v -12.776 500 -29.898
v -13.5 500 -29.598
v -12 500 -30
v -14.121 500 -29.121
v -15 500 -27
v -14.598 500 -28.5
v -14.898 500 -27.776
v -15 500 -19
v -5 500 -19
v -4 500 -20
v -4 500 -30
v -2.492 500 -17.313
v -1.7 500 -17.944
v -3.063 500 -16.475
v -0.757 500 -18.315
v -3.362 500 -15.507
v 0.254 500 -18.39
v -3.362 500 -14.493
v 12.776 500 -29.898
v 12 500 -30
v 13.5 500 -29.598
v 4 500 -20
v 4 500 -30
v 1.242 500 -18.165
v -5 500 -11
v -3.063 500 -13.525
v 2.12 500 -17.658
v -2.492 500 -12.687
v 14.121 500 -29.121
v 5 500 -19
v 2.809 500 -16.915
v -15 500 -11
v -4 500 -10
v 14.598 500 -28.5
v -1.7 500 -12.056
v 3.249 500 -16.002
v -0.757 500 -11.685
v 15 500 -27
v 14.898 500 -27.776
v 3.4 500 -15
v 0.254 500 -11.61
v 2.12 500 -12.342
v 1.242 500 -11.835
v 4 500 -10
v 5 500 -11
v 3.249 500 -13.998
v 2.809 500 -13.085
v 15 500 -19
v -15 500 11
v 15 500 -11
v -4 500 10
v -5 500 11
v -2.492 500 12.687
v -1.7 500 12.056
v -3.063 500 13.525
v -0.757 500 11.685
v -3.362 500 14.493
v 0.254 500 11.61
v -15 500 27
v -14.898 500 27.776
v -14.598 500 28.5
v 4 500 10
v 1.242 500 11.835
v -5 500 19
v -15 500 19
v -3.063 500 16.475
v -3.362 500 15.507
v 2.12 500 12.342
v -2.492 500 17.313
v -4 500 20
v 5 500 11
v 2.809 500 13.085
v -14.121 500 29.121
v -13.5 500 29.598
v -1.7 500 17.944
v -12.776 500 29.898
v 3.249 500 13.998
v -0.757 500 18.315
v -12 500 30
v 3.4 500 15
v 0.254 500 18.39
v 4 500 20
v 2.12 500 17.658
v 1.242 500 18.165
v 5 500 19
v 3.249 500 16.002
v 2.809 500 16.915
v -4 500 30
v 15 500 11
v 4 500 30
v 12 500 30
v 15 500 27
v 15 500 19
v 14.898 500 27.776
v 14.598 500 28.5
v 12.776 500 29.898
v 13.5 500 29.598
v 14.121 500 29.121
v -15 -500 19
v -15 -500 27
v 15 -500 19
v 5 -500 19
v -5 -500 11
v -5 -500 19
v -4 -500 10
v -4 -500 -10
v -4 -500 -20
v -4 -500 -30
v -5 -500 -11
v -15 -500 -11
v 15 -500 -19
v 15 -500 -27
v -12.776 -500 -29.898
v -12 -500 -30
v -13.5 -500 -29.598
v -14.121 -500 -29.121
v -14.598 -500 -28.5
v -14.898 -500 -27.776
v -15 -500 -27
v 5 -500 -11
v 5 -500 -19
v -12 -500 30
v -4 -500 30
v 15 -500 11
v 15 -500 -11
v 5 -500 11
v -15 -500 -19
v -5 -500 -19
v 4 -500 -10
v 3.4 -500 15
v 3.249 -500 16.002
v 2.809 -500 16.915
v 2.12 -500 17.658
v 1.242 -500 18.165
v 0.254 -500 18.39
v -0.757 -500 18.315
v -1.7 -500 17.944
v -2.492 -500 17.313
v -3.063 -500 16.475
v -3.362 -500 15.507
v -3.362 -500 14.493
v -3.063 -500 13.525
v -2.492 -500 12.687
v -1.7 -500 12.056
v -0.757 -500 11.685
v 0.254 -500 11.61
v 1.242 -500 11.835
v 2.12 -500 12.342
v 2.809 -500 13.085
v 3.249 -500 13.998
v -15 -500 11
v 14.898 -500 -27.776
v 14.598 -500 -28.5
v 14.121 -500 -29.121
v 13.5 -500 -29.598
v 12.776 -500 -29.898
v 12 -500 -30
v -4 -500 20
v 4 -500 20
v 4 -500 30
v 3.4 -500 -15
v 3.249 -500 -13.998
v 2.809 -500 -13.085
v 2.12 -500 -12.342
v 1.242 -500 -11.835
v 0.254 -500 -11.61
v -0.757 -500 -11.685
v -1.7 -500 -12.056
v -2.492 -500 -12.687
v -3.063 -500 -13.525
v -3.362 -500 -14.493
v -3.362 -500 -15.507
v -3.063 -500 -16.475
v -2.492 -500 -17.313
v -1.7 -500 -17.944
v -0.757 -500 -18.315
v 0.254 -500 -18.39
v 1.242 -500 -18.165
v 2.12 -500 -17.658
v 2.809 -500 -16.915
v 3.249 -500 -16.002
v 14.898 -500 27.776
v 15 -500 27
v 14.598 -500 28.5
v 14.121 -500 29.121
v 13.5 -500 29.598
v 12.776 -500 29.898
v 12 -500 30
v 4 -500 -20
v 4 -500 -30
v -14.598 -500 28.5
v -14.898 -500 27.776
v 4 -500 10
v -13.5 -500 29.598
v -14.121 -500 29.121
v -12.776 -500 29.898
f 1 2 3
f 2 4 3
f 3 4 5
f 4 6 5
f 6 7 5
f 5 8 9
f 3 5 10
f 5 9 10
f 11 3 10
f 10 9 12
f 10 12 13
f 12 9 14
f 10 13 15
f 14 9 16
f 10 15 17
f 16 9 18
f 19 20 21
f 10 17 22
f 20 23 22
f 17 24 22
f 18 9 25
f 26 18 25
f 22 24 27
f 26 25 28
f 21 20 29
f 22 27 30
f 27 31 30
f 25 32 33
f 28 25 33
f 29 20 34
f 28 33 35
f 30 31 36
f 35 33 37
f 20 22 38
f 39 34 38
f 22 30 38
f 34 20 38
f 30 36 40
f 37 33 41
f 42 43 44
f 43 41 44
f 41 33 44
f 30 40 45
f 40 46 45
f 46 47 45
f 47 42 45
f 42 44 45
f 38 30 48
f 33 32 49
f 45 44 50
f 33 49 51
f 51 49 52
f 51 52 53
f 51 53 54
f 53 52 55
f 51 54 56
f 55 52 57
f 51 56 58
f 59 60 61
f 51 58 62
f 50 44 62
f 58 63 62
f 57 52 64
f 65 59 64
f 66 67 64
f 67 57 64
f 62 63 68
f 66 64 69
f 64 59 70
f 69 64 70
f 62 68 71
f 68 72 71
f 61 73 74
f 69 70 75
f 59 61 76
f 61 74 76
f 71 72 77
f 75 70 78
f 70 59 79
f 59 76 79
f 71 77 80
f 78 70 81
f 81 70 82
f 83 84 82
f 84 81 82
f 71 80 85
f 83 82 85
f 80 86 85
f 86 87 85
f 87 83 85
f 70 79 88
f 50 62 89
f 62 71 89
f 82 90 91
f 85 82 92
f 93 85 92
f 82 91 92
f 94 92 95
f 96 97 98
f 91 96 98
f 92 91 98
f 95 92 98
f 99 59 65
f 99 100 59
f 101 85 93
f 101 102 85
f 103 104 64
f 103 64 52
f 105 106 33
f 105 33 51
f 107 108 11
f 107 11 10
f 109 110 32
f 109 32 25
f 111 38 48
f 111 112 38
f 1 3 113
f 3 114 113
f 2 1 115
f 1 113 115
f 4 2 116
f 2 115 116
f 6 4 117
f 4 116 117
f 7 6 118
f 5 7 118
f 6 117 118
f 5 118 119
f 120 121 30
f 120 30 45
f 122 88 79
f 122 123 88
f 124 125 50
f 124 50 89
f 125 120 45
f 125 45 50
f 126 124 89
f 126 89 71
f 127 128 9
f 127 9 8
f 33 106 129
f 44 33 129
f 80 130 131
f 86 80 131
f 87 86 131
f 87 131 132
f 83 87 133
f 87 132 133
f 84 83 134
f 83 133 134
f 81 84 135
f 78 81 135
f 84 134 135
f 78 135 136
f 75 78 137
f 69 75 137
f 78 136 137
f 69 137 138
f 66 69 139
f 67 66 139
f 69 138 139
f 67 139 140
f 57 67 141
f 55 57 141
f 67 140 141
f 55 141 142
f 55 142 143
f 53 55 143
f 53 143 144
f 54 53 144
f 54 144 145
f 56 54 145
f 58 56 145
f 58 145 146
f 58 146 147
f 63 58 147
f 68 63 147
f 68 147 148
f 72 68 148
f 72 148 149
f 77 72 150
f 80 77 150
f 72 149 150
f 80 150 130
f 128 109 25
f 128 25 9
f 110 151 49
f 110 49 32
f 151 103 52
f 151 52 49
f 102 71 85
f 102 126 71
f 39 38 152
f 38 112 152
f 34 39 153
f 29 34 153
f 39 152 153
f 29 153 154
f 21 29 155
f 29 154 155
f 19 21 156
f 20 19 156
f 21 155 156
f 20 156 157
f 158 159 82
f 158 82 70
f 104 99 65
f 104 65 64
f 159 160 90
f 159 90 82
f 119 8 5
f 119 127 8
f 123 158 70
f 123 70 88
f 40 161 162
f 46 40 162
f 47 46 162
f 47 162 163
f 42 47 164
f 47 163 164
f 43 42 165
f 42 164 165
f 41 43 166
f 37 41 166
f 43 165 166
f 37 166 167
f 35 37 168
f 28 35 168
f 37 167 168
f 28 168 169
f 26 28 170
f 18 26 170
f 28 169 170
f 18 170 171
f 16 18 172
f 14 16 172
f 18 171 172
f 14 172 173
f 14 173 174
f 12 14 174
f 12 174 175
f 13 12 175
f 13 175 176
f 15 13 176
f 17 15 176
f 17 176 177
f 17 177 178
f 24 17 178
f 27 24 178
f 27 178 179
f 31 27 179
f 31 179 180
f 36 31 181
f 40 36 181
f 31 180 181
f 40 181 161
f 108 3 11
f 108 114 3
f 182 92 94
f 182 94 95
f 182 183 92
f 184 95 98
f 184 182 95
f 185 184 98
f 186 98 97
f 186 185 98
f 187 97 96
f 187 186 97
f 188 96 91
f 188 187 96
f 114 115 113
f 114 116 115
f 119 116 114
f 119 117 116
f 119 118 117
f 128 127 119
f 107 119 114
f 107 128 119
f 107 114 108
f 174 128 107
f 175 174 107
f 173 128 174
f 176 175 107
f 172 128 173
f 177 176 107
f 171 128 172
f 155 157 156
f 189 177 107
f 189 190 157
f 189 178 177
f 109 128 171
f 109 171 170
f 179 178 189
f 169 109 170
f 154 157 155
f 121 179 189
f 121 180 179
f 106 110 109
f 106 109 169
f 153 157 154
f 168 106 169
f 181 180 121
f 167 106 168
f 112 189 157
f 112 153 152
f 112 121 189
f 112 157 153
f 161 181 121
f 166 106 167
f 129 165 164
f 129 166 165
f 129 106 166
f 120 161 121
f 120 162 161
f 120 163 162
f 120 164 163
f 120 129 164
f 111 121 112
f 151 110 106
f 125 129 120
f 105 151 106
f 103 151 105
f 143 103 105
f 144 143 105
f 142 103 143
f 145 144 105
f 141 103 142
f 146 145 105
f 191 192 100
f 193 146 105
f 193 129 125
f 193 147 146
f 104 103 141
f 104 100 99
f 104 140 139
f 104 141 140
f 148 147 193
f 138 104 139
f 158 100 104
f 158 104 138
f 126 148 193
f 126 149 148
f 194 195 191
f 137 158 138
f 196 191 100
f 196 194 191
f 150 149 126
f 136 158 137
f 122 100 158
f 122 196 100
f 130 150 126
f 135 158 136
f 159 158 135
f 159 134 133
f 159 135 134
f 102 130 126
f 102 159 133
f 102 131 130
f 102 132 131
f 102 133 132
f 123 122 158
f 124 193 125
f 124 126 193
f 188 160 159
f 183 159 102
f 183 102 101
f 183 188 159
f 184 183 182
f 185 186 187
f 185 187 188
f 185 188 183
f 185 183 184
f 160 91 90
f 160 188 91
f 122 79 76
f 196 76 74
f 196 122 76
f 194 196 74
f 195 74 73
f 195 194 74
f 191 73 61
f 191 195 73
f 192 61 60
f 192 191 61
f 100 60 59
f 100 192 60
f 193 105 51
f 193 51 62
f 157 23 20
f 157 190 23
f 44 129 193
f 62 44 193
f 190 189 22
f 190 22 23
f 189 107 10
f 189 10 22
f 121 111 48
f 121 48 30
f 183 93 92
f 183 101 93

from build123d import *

# Parameters (mm, degrees)
F1_DEPTH = 500
F2_R     = 3.4
F2_W     = 8
F2_H     = 20
F3_DEPTH = 1000
F4_R     = 3


with BuildPart() as f1:
    # F0 (on Front) → F1 (new body, symmetric)
    with BuildSketch(Plane.XZ):
        Polygon((15, 19), (15, 30), (4, 30), (4, 20), (-4, 20), (-4, 30), (-15, 30), (-15, 19), (-5, 19), (-5, 11), (-15, 11), (-15, -11), (-5, -11), (-5, -19), (-15, -19), (-15, -30), (-4, -30), (-4, -20), (4, -20), (4, -30), (15, -30), (15, -19), (5, -19), (5, -11), (15, -11), (15, 11), (5, 11), (5, 19), align=None)
    extrude(amount=F1_DEPTH, both=True)

    # F2 (on face) → F3 (cut)
    with BuildSketch(Plane.XZ.offset(500)):
        with Locations((0, -15)):
            Circle(F2_R)
        Rectangle(F2_W, F2_H)
        with Locations((0, 15)):
            Circle(F2_R)
    extrude(amount=-F3_DEPTH, mode=Mode.SUBTRACT)

    # F4
    f4_edges = [f1.edges().sort_by_distance(p)[0] for p in [
        (-15, 0, -30),
        (15, 0, -30),
        (15, 0, 30),
        (-15, 0, 30),
    ]]
    fillet(f4_edges, radius=F4_R)


solid = f1.part
